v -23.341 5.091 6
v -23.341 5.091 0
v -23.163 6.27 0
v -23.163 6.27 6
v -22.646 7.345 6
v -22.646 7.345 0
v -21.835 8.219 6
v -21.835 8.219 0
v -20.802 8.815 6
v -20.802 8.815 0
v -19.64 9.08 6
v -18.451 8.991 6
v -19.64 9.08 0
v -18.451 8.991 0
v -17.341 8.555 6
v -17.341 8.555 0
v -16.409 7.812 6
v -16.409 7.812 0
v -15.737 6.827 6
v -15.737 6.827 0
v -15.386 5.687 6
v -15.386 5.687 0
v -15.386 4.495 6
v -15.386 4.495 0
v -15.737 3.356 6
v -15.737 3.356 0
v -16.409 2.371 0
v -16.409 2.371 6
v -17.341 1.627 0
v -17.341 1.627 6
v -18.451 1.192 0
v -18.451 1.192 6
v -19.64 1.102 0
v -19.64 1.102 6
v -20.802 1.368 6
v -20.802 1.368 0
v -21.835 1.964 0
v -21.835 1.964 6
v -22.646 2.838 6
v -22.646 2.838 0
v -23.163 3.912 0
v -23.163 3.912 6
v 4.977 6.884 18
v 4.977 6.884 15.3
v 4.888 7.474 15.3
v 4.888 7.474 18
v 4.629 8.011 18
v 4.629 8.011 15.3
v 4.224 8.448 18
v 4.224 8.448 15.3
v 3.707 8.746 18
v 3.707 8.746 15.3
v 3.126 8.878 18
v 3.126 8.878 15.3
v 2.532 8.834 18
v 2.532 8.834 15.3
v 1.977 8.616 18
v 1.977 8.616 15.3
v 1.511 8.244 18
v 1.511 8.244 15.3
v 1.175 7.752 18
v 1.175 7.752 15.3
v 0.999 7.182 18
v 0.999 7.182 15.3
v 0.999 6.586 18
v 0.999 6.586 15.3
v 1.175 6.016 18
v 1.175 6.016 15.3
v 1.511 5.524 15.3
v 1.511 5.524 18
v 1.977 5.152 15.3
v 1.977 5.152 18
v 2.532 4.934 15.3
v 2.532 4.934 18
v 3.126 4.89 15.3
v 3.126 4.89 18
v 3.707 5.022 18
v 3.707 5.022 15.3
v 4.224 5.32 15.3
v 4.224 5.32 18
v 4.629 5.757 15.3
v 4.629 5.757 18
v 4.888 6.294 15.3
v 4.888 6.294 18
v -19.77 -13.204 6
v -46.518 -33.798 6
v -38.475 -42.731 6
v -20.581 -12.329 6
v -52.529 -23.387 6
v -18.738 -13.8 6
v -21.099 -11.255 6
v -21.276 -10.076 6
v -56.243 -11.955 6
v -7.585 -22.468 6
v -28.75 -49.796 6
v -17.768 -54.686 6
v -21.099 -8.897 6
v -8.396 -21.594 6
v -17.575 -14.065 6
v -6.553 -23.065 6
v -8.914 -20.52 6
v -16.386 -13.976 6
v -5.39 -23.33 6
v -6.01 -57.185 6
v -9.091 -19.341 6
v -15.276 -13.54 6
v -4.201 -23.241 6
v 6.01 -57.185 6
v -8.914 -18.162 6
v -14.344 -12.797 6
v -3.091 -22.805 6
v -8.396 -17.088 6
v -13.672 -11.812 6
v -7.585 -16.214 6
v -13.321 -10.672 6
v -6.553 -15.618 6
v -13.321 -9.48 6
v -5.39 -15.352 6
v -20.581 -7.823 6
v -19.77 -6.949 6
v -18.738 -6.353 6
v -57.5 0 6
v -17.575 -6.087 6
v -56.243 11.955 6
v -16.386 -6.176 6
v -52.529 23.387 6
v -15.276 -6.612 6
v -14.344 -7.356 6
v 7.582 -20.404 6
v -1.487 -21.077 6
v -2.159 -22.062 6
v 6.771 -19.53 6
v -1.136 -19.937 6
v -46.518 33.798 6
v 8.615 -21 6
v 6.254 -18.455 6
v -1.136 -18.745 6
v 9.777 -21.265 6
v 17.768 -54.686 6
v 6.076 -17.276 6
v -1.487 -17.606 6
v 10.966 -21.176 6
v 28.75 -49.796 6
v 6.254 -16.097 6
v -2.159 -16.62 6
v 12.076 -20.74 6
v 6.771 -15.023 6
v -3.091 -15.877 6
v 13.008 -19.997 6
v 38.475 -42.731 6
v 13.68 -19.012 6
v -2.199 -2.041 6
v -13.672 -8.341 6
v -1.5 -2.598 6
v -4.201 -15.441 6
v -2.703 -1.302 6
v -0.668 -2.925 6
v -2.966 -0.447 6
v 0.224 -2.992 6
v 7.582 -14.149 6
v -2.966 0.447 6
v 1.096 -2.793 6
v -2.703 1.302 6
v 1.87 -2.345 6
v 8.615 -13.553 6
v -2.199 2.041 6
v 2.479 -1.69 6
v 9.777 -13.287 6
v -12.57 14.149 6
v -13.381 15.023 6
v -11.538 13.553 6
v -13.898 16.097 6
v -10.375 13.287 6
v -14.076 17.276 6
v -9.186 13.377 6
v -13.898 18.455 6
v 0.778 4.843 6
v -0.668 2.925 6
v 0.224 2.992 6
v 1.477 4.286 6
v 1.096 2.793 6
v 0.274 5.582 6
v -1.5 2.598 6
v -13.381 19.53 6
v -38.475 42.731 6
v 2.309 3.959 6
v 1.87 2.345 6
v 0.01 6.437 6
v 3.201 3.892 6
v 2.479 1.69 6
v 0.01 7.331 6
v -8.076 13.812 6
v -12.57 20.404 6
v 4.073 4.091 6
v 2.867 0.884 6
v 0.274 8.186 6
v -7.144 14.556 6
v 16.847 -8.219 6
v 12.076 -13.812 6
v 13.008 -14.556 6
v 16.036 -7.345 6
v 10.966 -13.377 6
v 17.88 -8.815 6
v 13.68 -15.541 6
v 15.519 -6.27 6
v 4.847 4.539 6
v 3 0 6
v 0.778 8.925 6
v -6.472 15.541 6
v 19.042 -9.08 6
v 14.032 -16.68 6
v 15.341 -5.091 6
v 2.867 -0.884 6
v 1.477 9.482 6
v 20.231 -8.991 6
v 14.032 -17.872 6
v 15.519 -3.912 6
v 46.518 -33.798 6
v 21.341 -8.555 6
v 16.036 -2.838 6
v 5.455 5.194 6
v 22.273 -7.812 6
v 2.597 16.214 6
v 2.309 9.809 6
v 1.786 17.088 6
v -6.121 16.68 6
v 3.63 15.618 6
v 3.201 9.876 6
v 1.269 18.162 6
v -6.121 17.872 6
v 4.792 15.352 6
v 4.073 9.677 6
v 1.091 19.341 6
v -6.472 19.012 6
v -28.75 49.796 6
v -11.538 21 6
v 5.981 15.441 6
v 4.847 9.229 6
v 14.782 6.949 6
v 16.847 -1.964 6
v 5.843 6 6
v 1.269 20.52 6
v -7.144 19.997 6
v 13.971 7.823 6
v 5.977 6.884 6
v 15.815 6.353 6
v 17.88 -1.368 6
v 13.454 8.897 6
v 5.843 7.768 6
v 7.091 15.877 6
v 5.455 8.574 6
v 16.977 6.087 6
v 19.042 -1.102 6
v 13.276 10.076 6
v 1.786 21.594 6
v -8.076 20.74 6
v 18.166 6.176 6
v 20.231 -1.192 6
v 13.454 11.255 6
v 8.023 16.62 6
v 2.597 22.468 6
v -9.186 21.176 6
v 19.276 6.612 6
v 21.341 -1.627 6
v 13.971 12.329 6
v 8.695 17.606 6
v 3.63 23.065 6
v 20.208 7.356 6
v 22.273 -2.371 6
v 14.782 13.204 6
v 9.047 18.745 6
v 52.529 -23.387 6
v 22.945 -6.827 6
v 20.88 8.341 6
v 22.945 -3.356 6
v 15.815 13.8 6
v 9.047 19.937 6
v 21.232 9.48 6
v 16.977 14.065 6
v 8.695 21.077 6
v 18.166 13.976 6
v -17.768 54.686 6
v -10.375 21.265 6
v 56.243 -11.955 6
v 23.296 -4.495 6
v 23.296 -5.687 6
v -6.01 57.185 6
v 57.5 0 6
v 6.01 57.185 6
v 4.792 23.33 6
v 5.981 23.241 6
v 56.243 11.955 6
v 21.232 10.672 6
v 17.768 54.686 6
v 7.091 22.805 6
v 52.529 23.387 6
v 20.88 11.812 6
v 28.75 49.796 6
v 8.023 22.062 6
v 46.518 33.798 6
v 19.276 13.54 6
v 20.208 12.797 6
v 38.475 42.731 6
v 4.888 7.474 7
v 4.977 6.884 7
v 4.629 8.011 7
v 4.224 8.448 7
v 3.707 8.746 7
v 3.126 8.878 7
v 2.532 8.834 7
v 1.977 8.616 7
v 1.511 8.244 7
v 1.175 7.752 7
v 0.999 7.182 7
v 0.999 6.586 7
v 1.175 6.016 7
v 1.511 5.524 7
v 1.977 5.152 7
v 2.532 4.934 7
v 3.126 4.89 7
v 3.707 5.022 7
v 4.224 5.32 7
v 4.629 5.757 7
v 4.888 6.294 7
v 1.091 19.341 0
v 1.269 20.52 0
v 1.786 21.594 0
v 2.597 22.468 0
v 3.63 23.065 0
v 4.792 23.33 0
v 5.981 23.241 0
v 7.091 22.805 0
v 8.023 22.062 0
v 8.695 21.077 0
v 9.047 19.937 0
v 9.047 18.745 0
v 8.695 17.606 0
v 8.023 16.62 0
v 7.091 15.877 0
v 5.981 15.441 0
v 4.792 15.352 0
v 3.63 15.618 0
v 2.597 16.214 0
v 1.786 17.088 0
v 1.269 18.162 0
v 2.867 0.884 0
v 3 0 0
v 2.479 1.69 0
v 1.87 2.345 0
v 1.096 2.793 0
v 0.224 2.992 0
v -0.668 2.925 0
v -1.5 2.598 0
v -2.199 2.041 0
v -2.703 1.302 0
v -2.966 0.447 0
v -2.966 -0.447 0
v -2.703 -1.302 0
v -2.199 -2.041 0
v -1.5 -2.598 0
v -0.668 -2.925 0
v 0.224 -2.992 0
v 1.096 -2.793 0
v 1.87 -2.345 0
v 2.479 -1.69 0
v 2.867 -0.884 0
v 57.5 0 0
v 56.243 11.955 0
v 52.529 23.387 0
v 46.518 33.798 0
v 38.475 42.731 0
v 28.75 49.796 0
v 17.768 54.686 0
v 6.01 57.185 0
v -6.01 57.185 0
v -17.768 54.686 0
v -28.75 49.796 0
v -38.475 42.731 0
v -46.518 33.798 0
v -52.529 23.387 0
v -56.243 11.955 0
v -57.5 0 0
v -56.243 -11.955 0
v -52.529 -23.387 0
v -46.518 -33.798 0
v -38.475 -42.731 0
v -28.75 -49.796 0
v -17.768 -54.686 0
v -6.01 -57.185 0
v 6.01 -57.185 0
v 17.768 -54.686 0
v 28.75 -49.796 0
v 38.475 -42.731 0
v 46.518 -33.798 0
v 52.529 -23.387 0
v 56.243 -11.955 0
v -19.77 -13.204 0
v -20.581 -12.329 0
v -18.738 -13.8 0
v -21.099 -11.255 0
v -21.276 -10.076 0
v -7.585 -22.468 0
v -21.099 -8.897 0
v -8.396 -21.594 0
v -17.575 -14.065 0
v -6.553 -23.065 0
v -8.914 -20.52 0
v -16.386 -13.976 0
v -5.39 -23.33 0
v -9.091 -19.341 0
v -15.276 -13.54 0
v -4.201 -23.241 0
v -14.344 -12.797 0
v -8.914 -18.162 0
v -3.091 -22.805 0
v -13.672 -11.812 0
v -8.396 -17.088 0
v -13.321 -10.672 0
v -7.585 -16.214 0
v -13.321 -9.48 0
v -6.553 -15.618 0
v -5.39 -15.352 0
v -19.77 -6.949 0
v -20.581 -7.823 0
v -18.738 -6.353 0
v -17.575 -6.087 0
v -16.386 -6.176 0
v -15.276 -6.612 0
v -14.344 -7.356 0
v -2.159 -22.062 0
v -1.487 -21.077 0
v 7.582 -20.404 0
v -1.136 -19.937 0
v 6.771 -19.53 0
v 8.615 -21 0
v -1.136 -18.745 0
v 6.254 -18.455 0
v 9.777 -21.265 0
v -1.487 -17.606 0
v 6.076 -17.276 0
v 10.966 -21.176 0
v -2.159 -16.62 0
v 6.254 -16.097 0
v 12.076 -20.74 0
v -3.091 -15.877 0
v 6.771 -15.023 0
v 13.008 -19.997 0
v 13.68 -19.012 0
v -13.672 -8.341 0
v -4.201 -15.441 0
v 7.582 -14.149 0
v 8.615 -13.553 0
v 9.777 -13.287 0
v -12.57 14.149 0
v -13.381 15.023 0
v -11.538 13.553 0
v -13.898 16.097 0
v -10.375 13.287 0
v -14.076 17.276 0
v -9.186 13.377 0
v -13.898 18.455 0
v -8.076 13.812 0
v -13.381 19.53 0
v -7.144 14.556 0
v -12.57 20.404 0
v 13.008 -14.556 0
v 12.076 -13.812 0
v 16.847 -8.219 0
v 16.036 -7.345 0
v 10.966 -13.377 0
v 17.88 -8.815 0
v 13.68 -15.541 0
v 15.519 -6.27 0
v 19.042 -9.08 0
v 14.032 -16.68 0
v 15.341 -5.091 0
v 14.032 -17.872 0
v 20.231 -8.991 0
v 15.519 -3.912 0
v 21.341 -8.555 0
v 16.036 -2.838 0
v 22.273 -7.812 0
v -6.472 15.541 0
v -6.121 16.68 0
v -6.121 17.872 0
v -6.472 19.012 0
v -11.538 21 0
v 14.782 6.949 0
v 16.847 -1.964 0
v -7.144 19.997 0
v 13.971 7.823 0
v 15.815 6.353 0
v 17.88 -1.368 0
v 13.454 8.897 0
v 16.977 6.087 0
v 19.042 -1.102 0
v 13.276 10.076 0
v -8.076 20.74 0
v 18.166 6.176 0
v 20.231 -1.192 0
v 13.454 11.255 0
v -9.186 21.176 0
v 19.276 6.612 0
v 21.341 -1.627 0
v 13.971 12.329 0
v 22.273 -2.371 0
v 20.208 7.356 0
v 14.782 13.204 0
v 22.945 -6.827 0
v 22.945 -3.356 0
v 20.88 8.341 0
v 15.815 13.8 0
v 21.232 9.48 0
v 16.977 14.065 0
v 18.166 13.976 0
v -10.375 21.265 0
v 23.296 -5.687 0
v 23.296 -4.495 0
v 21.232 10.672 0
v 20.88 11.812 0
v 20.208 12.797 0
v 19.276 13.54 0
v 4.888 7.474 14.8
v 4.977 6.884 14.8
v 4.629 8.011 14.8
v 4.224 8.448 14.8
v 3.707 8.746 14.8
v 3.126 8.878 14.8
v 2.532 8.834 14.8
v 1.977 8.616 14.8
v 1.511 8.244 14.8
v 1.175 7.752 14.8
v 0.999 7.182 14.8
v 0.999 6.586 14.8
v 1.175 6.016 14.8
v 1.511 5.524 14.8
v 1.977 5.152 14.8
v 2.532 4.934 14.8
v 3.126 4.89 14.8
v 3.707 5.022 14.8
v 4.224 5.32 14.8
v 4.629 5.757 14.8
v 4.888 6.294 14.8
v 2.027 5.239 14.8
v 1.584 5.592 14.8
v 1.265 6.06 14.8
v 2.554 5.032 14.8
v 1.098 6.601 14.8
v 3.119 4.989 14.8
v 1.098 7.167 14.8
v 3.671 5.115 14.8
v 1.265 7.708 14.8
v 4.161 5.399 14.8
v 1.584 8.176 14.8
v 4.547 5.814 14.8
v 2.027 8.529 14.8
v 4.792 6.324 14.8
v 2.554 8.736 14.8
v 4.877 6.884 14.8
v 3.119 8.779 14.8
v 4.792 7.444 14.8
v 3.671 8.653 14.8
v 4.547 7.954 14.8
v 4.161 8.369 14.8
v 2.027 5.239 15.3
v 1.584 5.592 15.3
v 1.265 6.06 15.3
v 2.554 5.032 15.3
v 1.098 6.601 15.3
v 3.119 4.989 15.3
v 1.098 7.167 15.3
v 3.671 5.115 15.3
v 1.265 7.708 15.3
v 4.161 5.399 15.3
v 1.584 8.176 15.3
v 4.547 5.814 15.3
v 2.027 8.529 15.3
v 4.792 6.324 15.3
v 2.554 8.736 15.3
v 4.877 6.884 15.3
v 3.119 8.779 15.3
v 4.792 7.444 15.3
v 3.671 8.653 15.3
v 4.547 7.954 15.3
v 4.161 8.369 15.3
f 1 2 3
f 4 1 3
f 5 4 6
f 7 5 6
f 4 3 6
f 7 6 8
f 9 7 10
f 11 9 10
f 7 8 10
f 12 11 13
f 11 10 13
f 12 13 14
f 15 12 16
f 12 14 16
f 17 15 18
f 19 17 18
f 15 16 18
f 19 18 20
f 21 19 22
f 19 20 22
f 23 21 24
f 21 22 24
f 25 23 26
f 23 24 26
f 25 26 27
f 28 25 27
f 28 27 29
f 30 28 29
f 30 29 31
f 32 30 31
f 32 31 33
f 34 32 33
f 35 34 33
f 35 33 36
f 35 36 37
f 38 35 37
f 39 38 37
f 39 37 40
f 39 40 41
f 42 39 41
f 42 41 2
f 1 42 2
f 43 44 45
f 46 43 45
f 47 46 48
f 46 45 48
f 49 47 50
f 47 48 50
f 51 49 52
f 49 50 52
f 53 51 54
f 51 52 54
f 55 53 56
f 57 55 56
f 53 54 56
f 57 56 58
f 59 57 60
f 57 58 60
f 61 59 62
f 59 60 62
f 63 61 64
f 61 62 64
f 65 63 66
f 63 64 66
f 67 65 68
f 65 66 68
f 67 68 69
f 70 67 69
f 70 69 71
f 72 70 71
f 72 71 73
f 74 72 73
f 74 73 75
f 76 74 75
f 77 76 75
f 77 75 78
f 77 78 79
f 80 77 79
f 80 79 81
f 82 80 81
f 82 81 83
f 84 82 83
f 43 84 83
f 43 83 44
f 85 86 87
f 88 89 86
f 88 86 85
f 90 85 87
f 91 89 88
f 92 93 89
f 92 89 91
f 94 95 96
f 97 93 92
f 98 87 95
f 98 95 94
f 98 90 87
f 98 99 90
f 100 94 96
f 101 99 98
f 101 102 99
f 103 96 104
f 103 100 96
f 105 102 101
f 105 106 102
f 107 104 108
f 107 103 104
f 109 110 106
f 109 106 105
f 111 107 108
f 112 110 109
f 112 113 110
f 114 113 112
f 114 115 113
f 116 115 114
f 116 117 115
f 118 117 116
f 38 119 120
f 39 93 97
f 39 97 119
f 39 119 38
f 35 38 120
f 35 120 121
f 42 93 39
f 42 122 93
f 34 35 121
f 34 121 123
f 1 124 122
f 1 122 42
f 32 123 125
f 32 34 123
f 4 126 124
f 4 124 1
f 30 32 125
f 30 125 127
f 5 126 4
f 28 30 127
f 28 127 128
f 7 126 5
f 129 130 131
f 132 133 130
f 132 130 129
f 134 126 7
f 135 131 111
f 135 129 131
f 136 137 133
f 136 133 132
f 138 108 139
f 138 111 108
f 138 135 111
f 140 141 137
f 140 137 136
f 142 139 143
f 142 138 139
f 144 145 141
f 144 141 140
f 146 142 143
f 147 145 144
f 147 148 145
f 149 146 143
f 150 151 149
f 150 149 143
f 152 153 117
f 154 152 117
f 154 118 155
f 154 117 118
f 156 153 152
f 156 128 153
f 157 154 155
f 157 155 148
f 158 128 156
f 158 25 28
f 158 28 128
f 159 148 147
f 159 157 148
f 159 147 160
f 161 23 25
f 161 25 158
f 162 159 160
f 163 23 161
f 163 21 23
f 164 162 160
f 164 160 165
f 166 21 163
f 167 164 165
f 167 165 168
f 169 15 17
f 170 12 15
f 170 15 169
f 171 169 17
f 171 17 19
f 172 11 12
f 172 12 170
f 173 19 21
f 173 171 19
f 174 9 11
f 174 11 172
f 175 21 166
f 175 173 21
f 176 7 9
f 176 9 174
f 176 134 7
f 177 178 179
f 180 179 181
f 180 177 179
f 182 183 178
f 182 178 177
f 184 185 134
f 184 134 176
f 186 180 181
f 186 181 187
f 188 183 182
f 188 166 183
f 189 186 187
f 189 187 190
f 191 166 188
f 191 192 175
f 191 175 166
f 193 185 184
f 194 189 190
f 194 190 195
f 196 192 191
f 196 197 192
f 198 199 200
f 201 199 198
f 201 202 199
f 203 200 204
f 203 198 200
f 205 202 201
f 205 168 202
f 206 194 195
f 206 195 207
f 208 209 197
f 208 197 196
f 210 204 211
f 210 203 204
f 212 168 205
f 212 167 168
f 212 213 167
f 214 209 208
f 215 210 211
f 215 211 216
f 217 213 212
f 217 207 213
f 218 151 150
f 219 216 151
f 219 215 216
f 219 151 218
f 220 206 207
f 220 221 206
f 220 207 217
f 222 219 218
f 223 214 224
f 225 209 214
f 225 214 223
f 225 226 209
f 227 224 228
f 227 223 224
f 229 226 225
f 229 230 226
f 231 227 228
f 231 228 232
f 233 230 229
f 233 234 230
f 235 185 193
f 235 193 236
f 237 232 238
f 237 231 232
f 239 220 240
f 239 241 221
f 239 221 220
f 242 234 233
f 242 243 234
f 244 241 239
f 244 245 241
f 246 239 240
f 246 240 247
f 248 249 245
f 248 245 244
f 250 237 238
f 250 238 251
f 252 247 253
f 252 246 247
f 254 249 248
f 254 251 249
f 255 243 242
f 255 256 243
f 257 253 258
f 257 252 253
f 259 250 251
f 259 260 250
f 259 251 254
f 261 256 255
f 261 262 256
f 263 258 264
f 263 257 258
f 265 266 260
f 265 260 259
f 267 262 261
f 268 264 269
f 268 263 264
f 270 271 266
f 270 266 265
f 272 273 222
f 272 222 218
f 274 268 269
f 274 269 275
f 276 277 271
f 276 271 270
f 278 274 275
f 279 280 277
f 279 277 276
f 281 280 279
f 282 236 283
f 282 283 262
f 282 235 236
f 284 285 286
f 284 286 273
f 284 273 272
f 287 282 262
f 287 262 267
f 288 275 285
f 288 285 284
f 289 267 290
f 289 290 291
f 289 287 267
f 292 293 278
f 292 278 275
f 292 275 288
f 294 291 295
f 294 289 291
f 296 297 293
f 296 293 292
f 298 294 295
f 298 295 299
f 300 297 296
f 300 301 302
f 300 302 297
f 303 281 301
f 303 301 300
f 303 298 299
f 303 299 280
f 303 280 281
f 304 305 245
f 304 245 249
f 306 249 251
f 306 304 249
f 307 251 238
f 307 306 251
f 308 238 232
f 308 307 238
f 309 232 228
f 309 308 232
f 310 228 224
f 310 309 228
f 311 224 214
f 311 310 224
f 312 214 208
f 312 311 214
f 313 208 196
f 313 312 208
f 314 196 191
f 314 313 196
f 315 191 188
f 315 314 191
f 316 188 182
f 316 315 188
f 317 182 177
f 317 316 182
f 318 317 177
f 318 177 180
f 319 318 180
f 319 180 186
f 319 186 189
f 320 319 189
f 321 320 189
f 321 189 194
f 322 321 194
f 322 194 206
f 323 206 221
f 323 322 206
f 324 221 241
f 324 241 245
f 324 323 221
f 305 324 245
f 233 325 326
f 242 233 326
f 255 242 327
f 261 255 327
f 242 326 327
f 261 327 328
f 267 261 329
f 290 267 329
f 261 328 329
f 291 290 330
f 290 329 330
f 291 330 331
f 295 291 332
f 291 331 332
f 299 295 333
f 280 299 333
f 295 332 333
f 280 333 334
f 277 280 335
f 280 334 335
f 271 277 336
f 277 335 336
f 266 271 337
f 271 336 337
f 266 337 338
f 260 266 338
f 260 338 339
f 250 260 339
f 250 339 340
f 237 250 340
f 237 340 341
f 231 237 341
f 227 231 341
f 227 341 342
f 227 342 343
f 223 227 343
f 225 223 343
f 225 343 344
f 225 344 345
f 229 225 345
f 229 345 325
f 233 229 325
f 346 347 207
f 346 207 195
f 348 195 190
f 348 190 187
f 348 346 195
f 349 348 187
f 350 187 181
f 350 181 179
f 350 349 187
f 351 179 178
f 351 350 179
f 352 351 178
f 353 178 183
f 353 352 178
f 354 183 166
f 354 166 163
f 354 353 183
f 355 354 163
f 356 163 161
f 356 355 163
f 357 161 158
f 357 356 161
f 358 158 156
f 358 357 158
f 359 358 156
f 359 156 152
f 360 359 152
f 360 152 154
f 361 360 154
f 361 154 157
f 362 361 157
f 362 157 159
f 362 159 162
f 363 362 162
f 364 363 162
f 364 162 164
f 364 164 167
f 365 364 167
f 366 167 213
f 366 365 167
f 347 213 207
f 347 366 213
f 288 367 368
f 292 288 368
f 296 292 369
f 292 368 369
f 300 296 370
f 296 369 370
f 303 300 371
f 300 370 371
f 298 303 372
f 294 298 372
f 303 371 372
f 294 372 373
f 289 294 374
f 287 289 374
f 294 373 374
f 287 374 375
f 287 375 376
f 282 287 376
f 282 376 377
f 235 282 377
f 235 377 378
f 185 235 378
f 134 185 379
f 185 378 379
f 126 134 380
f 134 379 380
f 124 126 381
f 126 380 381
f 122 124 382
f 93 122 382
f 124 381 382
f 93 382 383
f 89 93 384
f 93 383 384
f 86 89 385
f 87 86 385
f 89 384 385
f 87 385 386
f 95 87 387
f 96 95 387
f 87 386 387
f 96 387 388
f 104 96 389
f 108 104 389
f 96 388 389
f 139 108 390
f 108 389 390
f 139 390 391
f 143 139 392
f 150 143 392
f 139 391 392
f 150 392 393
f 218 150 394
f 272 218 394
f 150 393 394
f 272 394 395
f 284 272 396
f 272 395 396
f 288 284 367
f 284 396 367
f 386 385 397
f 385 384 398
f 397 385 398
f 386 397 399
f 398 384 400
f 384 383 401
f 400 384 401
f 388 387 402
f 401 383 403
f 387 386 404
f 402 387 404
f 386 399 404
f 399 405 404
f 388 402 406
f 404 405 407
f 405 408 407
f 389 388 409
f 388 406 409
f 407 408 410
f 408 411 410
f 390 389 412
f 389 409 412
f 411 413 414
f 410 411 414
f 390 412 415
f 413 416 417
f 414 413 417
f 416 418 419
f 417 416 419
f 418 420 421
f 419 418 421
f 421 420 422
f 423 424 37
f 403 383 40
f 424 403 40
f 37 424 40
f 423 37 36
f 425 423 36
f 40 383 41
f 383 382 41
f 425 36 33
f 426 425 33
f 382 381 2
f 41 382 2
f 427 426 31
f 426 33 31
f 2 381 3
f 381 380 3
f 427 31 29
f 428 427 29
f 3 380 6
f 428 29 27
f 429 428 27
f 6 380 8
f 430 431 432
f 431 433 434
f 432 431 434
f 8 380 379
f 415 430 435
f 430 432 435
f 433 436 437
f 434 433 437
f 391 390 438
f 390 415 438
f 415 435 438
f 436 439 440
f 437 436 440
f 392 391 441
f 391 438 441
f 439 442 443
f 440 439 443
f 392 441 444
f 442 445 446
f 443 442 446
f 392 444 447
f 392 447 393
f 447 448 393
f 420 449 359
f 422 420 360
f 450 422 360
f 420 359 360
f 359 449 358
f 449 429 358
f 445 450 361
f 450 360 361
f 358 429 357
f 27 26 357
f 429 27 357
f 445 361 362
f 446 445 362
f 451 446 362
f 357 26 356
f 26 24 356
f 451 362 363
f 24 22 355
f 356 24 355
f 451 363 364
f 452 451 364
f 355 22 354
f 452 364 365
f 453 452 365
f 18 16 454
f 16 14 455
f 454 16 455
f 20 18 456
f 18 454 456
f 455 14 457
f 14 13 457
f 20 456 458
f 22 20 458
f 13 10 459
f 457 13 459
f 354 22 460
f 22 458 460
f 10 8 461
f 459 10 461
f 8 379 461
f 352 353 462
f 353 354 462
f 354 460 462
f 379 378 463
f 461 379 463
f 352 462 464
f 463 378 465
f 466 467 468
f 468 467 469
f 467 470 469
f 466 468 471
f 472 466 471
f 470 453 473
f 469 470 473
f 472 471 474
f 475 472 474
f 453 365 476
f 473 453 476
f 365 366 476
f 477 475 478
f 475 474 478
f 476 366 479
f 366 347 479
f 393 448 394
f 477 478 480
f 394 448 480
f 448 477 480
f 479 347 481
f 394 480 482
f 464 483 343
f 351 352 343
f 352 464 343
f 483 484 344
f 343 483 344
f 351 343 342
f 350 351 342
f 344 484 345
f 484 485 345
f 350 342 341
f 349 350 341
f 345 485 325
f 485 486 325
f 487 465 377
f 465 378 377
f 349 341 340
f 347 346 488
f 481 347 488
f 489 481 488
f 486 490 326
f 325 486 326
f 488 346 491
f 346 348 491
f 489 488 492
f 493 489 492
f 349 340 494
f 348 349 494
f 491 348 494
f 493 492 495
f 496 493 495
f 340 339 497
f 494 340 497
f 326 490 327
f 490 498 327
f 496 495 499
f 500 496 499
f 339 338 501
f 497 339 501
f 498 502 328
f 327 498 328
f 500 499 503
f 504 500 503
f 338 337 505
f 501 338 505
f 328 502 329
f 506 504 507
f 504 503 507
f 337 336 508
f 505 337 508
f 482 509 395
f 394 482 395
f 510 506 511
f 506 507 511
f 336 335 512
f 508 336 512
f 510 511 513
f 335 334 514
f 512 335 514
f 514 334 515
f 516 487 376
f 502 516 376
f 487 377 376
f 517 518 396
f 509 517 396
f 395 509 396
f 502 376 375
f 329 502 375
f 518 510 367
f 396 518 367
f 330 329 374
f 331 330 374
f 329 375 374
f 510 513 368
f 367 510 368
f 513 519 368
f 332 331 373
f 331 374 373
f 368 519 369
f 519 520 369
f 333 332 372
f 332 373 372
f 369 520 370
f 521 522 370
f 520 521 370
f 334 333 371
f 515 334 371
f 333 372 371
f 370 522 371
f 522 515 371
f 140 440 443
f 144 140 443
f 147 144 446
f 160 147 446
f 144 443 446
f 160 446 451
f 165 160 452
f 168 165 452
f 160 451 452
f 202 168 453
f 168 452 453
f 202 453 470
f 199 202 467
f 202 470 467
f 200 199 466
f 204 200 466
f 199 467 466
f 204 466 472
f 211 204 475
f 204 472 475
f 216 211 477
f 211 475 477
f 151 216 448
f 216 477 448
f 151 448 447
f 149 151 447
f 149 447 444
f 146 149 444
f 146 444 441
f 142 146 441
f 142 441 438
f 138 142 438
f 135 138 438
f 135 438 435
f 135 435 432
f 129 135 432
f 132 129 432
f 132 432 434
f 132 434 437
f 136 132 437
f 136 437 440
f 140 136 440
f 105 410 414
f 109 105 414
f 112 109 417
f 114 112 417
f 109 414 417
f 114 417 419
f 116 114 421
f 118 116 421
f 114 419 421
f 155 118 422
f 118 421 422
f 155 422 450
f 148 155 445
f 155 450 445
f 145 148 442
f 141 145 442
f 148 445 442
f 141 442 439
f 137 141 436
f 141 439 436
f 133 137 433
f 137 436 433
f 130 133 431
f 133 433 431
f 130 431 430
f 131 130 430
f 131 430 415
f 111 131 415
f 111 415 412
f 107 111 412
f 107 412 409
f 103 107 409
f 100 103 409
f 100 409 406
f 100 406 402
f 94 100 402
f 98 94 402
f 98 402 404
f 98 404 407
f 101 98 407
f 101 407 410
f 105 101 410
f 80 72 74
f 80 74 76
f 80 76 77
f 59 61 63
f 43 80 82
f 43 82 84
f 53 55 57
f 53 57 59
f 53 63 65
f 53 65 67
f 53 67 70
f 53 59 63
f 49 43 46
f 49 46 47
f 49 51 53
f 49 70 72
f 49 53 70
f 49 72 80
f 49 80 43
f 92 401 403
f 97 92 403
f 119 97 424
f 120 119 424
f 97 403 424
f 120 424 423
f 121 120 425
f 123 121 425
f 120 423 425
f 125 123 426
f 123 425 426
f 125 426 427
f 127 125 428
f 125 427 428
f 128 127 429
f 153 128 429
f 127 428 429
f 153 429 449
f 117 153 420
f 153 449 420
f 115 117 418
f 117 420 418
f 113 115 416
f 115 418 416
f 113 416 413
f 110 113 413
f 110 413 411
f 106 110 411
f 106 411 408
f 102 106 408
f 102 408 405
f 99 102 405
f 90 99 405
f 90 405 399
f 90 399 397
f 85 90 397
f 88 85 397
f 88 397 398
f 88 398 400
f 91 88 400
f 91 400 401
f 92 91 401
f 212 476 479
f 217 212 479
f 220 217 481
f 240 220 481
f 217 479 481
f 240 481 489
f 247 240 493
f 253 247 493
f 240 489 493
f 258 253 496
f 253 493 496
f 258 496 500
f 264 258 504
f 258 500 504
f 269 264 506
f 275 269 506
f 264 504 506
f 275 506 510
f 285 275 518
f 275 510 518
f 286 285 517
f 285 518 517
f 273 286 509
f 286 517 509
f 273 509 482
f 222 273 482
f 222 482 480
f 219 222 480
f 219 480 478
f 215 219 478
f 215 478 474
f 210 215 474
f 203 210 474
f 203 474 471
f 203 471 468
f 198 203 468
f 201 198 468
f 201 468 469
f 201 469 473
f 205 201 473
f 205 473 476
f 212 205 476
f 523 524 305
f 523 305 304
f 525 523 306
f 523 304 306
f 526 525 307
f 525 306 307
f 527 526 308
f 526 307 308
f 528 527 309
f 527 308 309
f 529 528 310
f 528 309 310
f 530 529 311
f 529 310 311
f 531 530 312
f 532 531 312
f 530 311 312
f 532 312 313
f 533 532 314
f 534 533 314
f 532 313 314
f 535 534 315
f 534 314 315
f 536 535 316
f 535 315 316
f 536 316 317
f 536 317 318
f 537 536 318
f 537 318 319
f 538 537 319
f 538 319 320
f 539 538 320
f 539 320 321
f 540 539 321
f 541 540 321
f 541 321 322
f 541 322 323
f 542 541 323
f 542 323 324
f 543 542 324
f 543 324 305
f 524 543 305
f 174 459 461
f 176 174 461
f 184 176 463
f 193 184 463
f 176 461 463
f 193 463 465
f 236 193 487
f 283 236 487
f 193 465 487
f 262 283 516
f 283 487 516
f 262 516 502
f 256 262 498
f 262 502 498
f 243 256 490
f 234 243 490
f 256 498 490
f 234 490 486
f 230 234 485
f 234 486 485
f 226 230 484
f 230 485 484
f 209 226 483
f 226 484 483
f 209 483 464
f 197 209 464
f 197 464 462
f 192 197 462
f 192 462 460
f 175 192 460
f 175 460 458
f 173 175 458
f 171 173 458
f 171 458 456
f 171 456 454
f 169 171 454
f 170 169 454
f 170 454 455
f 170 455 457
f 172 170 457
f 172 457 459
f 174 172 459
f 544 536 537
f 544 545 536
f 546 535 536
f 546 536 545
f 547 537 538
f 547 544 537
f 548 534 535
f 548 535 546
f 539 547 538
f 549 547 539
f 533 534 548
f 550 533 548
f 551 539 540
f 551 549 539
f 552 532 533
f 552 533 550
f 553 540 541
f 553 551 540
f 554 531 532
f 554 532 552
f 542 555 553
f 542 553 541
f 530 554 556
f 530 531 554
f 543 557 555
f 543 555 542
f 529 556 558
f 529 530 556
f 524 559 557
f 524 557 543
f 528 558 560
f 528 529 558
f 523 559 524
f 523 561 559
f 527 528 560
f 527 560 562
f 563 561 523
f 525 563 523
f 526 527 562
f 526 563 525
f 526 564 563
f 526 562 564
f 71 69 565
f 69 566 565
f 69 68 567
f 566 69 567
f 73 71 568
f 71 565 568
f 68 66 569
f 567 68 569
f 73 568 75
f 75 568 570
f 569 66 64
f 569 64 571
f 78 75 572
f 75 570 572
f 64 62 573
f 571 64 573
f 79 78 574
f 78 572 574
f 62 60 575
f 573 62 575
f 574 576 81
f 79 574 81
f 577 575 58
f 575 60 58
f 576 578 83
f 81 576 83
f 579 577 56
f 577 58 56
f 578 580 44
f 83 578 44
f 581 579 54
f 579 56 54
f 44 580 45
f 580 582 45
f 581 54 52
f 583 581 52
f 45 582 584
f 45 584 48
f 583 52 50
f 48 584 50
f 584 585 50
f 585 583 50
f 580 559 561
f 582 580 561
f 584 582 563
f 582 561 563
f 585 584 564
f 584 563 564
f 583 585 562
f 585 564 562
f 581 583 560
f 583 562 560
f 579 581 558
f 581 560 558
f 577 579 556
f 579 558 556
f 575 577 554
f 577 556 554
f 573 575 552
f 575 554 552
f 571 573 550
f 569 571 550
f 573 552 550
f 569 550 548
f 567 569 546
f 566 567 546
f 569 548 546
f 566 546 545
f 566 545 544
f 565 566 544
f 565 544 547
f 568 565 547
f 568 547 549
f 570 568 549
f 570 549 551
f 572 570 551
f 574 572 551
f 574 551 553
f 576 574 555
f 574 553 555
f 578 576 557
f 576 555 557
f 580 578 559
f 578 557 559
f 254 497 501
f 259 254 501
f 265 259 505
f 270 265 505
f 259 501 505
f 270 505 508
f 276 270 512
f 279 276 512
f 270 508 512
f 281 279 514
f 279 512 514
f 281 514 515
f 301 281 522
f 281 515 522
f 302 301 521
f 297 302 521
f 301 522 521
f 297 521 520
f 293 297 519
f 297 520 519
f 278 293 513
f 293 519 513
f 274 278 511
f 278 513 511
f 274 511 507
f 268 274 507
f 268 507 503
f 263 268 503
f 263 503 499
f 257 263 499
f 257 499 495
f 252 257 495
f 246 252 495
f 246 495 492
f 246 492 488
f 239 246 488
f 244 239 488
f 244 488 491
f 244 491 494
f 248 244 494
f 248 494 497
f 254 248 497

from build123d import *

# Parameters (mm, degrees)
SKETCH_1_R          = 57.5
SKETCH_1_R_2        = 3
EXTRUDE_1_DEPTH     = 6
SKETCH_3_R          = 4
CUT_EXTRUDE_2_DEPTH = 82.538334543
SKETCH_4_R          = 2
EXTRUDE_2_DEPTH     = 12
CUT_EXTRUDE_START   = -3.2
SKETCH_6_R          = 2
SKETCH_6_R_2        = 1.9
CUT_EXTRUDE_3_DEPTH = 0.5
CHAMFER_1_SIZE      = 1


with BuildPart() as part:
    # 草图1 → 凸台-拉伸1 (new body)
    with BuildSketch(Plane.XY):
        Circle(SKETCH_1_R)
        Circle(SKETCH_1_R_2, mode=Mode.SUBTRACT)
    extrude(amount=EXTRUDE_1_DEPTH)

    # 草图3 → 切除-拉伸2 (cut, through all)
    with BuildSketch(Plane(origin=(0, 0, 0), x_dir=(-1, 0, 0), z_dir=(0, 0, -1))):
        with Locations((-5.091227954, 19.341132281)):
            Circle(SKETCH_3_R)
        with Locations((10.076203981, 17.276287603)):
            Circle(SKETCH_3_R)
        with Locations((19.341132281, 5.091227954)):
            Circle(SKETCH_3_R)
        with Locations((17.276287603, -10.076203981)):
            Circle(SKETCH_3_R)
        with Locations((5.091227954, -19.341132281)):
            Circle(SKETCH_3_R)
        with Locations((-10.076203981, -17.276287603)):
            Circle(SKETCH_3_R)
        with Locations((-19.341132281, -5.091227954)):
            Circle(SKETCH_3_R)
        with Locations((-17.276287603, 10.076203981)):
            Circle(SKETCH_3_R)
    extrude(amount=-CUT_EXTRUDE_2_DEPTH, mode=Mode.SUBTRACT)

    # 草图4 → 凸台-拉伸2 (add)
    with BuildSketch(Plane.XY.offset(6)):
        with Locations((2.976659474, 6.884003078)):
            Circle(SKETCH_4_R)
    extrude(amount=EXTRUDE_2_DEPTH)

    # 草图6 → 切除-拉伸3 (cut)
    with BuildSketch(Plane.XY.offset(18).offset(CUT_EXTRUDE_START)):
        with Locations((2.976659474, 6.884003078)):
            Circle(SKETCH_6_R)
        with Locations((2.976659474, 6.884003078)):
            Circle(SKETCH_6_R_2, mode=Mode.SUBTRACT)
    extrude(amount=CUT_EXTRUDE_3_DEPTH, mode=Mode.SUBTRACT)

    # 倒角1
    chamfer_1_edges = [part.edges().sort_by_distance(p)[0] for p in [
        (0.976659474, 6.884003078, 6),
    ]]
    chamfer(chamfer_1_edges, length=CHAMFER_1_SIZE)


solid = part.part
